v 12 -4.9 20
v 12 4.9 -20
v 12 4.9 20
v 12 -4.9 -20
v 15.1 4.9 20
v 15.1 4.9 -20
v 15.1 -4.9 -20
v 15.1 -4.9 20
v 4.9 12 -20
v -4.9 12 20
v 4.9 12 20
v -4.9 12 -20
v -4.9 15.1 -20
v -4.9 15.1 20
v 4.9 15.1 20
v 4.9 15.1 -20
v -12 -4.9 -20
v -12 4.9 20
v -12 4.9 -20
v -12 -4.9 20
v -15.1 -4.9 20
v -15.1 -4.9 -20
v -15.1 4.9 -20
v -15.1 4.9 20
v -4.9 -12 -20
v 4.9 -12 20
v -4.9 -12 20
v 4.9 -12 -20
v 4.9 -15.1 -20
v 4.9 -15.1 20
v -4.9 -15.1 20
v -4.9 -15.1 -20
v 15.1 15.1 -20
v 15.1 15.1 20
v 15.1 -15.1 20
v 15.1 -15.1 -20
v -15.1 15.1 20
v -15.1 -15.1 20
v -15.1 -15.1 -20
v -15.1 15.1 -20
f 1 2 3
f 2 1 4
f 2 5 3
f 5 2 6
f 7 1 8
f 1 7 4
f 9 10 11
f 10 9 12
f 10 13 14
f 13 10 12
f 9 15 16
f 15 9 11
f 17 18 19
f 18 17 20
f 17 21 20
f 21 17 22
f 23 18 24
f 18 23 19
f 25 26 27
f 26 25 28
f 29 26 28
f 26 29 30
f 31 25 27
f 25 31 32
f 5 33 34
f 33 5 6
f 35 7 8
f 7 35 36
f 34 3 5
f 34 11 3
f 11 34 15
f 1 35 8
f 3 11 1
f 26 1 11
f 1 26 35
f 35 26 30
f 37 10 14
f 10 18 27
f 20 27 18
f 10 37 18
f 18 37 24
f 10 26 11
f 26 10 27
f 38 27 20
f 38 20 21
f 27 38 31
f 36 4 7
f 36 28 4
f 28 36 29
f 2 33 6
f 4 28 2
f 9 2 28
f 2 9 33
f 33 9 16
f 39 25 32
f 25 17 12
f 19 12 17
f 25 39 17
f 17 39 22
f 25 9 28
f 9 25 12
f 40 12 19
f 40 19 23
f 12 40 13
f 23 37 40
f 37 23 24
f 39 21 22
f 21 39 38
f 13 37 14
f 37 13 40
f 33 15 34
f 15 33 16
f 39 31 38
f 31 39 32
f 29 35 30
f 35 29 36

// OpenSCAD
extrusion = 30;
extrusion_block_width = 10;

module extrusion_cutout(h, extra) {
 	 difference() {
    cube([extrusion+extra, extrusion+extra, h], center=true);
    for (a = [0:90:359]) rotate([0, 0, a]) {
      translate([extrusion/2, 0, 0])
        cube([6, extrusion_block_width-extra, h+1], center=true);
    }
  }
}

extrusion_cutout(40,0.2);
